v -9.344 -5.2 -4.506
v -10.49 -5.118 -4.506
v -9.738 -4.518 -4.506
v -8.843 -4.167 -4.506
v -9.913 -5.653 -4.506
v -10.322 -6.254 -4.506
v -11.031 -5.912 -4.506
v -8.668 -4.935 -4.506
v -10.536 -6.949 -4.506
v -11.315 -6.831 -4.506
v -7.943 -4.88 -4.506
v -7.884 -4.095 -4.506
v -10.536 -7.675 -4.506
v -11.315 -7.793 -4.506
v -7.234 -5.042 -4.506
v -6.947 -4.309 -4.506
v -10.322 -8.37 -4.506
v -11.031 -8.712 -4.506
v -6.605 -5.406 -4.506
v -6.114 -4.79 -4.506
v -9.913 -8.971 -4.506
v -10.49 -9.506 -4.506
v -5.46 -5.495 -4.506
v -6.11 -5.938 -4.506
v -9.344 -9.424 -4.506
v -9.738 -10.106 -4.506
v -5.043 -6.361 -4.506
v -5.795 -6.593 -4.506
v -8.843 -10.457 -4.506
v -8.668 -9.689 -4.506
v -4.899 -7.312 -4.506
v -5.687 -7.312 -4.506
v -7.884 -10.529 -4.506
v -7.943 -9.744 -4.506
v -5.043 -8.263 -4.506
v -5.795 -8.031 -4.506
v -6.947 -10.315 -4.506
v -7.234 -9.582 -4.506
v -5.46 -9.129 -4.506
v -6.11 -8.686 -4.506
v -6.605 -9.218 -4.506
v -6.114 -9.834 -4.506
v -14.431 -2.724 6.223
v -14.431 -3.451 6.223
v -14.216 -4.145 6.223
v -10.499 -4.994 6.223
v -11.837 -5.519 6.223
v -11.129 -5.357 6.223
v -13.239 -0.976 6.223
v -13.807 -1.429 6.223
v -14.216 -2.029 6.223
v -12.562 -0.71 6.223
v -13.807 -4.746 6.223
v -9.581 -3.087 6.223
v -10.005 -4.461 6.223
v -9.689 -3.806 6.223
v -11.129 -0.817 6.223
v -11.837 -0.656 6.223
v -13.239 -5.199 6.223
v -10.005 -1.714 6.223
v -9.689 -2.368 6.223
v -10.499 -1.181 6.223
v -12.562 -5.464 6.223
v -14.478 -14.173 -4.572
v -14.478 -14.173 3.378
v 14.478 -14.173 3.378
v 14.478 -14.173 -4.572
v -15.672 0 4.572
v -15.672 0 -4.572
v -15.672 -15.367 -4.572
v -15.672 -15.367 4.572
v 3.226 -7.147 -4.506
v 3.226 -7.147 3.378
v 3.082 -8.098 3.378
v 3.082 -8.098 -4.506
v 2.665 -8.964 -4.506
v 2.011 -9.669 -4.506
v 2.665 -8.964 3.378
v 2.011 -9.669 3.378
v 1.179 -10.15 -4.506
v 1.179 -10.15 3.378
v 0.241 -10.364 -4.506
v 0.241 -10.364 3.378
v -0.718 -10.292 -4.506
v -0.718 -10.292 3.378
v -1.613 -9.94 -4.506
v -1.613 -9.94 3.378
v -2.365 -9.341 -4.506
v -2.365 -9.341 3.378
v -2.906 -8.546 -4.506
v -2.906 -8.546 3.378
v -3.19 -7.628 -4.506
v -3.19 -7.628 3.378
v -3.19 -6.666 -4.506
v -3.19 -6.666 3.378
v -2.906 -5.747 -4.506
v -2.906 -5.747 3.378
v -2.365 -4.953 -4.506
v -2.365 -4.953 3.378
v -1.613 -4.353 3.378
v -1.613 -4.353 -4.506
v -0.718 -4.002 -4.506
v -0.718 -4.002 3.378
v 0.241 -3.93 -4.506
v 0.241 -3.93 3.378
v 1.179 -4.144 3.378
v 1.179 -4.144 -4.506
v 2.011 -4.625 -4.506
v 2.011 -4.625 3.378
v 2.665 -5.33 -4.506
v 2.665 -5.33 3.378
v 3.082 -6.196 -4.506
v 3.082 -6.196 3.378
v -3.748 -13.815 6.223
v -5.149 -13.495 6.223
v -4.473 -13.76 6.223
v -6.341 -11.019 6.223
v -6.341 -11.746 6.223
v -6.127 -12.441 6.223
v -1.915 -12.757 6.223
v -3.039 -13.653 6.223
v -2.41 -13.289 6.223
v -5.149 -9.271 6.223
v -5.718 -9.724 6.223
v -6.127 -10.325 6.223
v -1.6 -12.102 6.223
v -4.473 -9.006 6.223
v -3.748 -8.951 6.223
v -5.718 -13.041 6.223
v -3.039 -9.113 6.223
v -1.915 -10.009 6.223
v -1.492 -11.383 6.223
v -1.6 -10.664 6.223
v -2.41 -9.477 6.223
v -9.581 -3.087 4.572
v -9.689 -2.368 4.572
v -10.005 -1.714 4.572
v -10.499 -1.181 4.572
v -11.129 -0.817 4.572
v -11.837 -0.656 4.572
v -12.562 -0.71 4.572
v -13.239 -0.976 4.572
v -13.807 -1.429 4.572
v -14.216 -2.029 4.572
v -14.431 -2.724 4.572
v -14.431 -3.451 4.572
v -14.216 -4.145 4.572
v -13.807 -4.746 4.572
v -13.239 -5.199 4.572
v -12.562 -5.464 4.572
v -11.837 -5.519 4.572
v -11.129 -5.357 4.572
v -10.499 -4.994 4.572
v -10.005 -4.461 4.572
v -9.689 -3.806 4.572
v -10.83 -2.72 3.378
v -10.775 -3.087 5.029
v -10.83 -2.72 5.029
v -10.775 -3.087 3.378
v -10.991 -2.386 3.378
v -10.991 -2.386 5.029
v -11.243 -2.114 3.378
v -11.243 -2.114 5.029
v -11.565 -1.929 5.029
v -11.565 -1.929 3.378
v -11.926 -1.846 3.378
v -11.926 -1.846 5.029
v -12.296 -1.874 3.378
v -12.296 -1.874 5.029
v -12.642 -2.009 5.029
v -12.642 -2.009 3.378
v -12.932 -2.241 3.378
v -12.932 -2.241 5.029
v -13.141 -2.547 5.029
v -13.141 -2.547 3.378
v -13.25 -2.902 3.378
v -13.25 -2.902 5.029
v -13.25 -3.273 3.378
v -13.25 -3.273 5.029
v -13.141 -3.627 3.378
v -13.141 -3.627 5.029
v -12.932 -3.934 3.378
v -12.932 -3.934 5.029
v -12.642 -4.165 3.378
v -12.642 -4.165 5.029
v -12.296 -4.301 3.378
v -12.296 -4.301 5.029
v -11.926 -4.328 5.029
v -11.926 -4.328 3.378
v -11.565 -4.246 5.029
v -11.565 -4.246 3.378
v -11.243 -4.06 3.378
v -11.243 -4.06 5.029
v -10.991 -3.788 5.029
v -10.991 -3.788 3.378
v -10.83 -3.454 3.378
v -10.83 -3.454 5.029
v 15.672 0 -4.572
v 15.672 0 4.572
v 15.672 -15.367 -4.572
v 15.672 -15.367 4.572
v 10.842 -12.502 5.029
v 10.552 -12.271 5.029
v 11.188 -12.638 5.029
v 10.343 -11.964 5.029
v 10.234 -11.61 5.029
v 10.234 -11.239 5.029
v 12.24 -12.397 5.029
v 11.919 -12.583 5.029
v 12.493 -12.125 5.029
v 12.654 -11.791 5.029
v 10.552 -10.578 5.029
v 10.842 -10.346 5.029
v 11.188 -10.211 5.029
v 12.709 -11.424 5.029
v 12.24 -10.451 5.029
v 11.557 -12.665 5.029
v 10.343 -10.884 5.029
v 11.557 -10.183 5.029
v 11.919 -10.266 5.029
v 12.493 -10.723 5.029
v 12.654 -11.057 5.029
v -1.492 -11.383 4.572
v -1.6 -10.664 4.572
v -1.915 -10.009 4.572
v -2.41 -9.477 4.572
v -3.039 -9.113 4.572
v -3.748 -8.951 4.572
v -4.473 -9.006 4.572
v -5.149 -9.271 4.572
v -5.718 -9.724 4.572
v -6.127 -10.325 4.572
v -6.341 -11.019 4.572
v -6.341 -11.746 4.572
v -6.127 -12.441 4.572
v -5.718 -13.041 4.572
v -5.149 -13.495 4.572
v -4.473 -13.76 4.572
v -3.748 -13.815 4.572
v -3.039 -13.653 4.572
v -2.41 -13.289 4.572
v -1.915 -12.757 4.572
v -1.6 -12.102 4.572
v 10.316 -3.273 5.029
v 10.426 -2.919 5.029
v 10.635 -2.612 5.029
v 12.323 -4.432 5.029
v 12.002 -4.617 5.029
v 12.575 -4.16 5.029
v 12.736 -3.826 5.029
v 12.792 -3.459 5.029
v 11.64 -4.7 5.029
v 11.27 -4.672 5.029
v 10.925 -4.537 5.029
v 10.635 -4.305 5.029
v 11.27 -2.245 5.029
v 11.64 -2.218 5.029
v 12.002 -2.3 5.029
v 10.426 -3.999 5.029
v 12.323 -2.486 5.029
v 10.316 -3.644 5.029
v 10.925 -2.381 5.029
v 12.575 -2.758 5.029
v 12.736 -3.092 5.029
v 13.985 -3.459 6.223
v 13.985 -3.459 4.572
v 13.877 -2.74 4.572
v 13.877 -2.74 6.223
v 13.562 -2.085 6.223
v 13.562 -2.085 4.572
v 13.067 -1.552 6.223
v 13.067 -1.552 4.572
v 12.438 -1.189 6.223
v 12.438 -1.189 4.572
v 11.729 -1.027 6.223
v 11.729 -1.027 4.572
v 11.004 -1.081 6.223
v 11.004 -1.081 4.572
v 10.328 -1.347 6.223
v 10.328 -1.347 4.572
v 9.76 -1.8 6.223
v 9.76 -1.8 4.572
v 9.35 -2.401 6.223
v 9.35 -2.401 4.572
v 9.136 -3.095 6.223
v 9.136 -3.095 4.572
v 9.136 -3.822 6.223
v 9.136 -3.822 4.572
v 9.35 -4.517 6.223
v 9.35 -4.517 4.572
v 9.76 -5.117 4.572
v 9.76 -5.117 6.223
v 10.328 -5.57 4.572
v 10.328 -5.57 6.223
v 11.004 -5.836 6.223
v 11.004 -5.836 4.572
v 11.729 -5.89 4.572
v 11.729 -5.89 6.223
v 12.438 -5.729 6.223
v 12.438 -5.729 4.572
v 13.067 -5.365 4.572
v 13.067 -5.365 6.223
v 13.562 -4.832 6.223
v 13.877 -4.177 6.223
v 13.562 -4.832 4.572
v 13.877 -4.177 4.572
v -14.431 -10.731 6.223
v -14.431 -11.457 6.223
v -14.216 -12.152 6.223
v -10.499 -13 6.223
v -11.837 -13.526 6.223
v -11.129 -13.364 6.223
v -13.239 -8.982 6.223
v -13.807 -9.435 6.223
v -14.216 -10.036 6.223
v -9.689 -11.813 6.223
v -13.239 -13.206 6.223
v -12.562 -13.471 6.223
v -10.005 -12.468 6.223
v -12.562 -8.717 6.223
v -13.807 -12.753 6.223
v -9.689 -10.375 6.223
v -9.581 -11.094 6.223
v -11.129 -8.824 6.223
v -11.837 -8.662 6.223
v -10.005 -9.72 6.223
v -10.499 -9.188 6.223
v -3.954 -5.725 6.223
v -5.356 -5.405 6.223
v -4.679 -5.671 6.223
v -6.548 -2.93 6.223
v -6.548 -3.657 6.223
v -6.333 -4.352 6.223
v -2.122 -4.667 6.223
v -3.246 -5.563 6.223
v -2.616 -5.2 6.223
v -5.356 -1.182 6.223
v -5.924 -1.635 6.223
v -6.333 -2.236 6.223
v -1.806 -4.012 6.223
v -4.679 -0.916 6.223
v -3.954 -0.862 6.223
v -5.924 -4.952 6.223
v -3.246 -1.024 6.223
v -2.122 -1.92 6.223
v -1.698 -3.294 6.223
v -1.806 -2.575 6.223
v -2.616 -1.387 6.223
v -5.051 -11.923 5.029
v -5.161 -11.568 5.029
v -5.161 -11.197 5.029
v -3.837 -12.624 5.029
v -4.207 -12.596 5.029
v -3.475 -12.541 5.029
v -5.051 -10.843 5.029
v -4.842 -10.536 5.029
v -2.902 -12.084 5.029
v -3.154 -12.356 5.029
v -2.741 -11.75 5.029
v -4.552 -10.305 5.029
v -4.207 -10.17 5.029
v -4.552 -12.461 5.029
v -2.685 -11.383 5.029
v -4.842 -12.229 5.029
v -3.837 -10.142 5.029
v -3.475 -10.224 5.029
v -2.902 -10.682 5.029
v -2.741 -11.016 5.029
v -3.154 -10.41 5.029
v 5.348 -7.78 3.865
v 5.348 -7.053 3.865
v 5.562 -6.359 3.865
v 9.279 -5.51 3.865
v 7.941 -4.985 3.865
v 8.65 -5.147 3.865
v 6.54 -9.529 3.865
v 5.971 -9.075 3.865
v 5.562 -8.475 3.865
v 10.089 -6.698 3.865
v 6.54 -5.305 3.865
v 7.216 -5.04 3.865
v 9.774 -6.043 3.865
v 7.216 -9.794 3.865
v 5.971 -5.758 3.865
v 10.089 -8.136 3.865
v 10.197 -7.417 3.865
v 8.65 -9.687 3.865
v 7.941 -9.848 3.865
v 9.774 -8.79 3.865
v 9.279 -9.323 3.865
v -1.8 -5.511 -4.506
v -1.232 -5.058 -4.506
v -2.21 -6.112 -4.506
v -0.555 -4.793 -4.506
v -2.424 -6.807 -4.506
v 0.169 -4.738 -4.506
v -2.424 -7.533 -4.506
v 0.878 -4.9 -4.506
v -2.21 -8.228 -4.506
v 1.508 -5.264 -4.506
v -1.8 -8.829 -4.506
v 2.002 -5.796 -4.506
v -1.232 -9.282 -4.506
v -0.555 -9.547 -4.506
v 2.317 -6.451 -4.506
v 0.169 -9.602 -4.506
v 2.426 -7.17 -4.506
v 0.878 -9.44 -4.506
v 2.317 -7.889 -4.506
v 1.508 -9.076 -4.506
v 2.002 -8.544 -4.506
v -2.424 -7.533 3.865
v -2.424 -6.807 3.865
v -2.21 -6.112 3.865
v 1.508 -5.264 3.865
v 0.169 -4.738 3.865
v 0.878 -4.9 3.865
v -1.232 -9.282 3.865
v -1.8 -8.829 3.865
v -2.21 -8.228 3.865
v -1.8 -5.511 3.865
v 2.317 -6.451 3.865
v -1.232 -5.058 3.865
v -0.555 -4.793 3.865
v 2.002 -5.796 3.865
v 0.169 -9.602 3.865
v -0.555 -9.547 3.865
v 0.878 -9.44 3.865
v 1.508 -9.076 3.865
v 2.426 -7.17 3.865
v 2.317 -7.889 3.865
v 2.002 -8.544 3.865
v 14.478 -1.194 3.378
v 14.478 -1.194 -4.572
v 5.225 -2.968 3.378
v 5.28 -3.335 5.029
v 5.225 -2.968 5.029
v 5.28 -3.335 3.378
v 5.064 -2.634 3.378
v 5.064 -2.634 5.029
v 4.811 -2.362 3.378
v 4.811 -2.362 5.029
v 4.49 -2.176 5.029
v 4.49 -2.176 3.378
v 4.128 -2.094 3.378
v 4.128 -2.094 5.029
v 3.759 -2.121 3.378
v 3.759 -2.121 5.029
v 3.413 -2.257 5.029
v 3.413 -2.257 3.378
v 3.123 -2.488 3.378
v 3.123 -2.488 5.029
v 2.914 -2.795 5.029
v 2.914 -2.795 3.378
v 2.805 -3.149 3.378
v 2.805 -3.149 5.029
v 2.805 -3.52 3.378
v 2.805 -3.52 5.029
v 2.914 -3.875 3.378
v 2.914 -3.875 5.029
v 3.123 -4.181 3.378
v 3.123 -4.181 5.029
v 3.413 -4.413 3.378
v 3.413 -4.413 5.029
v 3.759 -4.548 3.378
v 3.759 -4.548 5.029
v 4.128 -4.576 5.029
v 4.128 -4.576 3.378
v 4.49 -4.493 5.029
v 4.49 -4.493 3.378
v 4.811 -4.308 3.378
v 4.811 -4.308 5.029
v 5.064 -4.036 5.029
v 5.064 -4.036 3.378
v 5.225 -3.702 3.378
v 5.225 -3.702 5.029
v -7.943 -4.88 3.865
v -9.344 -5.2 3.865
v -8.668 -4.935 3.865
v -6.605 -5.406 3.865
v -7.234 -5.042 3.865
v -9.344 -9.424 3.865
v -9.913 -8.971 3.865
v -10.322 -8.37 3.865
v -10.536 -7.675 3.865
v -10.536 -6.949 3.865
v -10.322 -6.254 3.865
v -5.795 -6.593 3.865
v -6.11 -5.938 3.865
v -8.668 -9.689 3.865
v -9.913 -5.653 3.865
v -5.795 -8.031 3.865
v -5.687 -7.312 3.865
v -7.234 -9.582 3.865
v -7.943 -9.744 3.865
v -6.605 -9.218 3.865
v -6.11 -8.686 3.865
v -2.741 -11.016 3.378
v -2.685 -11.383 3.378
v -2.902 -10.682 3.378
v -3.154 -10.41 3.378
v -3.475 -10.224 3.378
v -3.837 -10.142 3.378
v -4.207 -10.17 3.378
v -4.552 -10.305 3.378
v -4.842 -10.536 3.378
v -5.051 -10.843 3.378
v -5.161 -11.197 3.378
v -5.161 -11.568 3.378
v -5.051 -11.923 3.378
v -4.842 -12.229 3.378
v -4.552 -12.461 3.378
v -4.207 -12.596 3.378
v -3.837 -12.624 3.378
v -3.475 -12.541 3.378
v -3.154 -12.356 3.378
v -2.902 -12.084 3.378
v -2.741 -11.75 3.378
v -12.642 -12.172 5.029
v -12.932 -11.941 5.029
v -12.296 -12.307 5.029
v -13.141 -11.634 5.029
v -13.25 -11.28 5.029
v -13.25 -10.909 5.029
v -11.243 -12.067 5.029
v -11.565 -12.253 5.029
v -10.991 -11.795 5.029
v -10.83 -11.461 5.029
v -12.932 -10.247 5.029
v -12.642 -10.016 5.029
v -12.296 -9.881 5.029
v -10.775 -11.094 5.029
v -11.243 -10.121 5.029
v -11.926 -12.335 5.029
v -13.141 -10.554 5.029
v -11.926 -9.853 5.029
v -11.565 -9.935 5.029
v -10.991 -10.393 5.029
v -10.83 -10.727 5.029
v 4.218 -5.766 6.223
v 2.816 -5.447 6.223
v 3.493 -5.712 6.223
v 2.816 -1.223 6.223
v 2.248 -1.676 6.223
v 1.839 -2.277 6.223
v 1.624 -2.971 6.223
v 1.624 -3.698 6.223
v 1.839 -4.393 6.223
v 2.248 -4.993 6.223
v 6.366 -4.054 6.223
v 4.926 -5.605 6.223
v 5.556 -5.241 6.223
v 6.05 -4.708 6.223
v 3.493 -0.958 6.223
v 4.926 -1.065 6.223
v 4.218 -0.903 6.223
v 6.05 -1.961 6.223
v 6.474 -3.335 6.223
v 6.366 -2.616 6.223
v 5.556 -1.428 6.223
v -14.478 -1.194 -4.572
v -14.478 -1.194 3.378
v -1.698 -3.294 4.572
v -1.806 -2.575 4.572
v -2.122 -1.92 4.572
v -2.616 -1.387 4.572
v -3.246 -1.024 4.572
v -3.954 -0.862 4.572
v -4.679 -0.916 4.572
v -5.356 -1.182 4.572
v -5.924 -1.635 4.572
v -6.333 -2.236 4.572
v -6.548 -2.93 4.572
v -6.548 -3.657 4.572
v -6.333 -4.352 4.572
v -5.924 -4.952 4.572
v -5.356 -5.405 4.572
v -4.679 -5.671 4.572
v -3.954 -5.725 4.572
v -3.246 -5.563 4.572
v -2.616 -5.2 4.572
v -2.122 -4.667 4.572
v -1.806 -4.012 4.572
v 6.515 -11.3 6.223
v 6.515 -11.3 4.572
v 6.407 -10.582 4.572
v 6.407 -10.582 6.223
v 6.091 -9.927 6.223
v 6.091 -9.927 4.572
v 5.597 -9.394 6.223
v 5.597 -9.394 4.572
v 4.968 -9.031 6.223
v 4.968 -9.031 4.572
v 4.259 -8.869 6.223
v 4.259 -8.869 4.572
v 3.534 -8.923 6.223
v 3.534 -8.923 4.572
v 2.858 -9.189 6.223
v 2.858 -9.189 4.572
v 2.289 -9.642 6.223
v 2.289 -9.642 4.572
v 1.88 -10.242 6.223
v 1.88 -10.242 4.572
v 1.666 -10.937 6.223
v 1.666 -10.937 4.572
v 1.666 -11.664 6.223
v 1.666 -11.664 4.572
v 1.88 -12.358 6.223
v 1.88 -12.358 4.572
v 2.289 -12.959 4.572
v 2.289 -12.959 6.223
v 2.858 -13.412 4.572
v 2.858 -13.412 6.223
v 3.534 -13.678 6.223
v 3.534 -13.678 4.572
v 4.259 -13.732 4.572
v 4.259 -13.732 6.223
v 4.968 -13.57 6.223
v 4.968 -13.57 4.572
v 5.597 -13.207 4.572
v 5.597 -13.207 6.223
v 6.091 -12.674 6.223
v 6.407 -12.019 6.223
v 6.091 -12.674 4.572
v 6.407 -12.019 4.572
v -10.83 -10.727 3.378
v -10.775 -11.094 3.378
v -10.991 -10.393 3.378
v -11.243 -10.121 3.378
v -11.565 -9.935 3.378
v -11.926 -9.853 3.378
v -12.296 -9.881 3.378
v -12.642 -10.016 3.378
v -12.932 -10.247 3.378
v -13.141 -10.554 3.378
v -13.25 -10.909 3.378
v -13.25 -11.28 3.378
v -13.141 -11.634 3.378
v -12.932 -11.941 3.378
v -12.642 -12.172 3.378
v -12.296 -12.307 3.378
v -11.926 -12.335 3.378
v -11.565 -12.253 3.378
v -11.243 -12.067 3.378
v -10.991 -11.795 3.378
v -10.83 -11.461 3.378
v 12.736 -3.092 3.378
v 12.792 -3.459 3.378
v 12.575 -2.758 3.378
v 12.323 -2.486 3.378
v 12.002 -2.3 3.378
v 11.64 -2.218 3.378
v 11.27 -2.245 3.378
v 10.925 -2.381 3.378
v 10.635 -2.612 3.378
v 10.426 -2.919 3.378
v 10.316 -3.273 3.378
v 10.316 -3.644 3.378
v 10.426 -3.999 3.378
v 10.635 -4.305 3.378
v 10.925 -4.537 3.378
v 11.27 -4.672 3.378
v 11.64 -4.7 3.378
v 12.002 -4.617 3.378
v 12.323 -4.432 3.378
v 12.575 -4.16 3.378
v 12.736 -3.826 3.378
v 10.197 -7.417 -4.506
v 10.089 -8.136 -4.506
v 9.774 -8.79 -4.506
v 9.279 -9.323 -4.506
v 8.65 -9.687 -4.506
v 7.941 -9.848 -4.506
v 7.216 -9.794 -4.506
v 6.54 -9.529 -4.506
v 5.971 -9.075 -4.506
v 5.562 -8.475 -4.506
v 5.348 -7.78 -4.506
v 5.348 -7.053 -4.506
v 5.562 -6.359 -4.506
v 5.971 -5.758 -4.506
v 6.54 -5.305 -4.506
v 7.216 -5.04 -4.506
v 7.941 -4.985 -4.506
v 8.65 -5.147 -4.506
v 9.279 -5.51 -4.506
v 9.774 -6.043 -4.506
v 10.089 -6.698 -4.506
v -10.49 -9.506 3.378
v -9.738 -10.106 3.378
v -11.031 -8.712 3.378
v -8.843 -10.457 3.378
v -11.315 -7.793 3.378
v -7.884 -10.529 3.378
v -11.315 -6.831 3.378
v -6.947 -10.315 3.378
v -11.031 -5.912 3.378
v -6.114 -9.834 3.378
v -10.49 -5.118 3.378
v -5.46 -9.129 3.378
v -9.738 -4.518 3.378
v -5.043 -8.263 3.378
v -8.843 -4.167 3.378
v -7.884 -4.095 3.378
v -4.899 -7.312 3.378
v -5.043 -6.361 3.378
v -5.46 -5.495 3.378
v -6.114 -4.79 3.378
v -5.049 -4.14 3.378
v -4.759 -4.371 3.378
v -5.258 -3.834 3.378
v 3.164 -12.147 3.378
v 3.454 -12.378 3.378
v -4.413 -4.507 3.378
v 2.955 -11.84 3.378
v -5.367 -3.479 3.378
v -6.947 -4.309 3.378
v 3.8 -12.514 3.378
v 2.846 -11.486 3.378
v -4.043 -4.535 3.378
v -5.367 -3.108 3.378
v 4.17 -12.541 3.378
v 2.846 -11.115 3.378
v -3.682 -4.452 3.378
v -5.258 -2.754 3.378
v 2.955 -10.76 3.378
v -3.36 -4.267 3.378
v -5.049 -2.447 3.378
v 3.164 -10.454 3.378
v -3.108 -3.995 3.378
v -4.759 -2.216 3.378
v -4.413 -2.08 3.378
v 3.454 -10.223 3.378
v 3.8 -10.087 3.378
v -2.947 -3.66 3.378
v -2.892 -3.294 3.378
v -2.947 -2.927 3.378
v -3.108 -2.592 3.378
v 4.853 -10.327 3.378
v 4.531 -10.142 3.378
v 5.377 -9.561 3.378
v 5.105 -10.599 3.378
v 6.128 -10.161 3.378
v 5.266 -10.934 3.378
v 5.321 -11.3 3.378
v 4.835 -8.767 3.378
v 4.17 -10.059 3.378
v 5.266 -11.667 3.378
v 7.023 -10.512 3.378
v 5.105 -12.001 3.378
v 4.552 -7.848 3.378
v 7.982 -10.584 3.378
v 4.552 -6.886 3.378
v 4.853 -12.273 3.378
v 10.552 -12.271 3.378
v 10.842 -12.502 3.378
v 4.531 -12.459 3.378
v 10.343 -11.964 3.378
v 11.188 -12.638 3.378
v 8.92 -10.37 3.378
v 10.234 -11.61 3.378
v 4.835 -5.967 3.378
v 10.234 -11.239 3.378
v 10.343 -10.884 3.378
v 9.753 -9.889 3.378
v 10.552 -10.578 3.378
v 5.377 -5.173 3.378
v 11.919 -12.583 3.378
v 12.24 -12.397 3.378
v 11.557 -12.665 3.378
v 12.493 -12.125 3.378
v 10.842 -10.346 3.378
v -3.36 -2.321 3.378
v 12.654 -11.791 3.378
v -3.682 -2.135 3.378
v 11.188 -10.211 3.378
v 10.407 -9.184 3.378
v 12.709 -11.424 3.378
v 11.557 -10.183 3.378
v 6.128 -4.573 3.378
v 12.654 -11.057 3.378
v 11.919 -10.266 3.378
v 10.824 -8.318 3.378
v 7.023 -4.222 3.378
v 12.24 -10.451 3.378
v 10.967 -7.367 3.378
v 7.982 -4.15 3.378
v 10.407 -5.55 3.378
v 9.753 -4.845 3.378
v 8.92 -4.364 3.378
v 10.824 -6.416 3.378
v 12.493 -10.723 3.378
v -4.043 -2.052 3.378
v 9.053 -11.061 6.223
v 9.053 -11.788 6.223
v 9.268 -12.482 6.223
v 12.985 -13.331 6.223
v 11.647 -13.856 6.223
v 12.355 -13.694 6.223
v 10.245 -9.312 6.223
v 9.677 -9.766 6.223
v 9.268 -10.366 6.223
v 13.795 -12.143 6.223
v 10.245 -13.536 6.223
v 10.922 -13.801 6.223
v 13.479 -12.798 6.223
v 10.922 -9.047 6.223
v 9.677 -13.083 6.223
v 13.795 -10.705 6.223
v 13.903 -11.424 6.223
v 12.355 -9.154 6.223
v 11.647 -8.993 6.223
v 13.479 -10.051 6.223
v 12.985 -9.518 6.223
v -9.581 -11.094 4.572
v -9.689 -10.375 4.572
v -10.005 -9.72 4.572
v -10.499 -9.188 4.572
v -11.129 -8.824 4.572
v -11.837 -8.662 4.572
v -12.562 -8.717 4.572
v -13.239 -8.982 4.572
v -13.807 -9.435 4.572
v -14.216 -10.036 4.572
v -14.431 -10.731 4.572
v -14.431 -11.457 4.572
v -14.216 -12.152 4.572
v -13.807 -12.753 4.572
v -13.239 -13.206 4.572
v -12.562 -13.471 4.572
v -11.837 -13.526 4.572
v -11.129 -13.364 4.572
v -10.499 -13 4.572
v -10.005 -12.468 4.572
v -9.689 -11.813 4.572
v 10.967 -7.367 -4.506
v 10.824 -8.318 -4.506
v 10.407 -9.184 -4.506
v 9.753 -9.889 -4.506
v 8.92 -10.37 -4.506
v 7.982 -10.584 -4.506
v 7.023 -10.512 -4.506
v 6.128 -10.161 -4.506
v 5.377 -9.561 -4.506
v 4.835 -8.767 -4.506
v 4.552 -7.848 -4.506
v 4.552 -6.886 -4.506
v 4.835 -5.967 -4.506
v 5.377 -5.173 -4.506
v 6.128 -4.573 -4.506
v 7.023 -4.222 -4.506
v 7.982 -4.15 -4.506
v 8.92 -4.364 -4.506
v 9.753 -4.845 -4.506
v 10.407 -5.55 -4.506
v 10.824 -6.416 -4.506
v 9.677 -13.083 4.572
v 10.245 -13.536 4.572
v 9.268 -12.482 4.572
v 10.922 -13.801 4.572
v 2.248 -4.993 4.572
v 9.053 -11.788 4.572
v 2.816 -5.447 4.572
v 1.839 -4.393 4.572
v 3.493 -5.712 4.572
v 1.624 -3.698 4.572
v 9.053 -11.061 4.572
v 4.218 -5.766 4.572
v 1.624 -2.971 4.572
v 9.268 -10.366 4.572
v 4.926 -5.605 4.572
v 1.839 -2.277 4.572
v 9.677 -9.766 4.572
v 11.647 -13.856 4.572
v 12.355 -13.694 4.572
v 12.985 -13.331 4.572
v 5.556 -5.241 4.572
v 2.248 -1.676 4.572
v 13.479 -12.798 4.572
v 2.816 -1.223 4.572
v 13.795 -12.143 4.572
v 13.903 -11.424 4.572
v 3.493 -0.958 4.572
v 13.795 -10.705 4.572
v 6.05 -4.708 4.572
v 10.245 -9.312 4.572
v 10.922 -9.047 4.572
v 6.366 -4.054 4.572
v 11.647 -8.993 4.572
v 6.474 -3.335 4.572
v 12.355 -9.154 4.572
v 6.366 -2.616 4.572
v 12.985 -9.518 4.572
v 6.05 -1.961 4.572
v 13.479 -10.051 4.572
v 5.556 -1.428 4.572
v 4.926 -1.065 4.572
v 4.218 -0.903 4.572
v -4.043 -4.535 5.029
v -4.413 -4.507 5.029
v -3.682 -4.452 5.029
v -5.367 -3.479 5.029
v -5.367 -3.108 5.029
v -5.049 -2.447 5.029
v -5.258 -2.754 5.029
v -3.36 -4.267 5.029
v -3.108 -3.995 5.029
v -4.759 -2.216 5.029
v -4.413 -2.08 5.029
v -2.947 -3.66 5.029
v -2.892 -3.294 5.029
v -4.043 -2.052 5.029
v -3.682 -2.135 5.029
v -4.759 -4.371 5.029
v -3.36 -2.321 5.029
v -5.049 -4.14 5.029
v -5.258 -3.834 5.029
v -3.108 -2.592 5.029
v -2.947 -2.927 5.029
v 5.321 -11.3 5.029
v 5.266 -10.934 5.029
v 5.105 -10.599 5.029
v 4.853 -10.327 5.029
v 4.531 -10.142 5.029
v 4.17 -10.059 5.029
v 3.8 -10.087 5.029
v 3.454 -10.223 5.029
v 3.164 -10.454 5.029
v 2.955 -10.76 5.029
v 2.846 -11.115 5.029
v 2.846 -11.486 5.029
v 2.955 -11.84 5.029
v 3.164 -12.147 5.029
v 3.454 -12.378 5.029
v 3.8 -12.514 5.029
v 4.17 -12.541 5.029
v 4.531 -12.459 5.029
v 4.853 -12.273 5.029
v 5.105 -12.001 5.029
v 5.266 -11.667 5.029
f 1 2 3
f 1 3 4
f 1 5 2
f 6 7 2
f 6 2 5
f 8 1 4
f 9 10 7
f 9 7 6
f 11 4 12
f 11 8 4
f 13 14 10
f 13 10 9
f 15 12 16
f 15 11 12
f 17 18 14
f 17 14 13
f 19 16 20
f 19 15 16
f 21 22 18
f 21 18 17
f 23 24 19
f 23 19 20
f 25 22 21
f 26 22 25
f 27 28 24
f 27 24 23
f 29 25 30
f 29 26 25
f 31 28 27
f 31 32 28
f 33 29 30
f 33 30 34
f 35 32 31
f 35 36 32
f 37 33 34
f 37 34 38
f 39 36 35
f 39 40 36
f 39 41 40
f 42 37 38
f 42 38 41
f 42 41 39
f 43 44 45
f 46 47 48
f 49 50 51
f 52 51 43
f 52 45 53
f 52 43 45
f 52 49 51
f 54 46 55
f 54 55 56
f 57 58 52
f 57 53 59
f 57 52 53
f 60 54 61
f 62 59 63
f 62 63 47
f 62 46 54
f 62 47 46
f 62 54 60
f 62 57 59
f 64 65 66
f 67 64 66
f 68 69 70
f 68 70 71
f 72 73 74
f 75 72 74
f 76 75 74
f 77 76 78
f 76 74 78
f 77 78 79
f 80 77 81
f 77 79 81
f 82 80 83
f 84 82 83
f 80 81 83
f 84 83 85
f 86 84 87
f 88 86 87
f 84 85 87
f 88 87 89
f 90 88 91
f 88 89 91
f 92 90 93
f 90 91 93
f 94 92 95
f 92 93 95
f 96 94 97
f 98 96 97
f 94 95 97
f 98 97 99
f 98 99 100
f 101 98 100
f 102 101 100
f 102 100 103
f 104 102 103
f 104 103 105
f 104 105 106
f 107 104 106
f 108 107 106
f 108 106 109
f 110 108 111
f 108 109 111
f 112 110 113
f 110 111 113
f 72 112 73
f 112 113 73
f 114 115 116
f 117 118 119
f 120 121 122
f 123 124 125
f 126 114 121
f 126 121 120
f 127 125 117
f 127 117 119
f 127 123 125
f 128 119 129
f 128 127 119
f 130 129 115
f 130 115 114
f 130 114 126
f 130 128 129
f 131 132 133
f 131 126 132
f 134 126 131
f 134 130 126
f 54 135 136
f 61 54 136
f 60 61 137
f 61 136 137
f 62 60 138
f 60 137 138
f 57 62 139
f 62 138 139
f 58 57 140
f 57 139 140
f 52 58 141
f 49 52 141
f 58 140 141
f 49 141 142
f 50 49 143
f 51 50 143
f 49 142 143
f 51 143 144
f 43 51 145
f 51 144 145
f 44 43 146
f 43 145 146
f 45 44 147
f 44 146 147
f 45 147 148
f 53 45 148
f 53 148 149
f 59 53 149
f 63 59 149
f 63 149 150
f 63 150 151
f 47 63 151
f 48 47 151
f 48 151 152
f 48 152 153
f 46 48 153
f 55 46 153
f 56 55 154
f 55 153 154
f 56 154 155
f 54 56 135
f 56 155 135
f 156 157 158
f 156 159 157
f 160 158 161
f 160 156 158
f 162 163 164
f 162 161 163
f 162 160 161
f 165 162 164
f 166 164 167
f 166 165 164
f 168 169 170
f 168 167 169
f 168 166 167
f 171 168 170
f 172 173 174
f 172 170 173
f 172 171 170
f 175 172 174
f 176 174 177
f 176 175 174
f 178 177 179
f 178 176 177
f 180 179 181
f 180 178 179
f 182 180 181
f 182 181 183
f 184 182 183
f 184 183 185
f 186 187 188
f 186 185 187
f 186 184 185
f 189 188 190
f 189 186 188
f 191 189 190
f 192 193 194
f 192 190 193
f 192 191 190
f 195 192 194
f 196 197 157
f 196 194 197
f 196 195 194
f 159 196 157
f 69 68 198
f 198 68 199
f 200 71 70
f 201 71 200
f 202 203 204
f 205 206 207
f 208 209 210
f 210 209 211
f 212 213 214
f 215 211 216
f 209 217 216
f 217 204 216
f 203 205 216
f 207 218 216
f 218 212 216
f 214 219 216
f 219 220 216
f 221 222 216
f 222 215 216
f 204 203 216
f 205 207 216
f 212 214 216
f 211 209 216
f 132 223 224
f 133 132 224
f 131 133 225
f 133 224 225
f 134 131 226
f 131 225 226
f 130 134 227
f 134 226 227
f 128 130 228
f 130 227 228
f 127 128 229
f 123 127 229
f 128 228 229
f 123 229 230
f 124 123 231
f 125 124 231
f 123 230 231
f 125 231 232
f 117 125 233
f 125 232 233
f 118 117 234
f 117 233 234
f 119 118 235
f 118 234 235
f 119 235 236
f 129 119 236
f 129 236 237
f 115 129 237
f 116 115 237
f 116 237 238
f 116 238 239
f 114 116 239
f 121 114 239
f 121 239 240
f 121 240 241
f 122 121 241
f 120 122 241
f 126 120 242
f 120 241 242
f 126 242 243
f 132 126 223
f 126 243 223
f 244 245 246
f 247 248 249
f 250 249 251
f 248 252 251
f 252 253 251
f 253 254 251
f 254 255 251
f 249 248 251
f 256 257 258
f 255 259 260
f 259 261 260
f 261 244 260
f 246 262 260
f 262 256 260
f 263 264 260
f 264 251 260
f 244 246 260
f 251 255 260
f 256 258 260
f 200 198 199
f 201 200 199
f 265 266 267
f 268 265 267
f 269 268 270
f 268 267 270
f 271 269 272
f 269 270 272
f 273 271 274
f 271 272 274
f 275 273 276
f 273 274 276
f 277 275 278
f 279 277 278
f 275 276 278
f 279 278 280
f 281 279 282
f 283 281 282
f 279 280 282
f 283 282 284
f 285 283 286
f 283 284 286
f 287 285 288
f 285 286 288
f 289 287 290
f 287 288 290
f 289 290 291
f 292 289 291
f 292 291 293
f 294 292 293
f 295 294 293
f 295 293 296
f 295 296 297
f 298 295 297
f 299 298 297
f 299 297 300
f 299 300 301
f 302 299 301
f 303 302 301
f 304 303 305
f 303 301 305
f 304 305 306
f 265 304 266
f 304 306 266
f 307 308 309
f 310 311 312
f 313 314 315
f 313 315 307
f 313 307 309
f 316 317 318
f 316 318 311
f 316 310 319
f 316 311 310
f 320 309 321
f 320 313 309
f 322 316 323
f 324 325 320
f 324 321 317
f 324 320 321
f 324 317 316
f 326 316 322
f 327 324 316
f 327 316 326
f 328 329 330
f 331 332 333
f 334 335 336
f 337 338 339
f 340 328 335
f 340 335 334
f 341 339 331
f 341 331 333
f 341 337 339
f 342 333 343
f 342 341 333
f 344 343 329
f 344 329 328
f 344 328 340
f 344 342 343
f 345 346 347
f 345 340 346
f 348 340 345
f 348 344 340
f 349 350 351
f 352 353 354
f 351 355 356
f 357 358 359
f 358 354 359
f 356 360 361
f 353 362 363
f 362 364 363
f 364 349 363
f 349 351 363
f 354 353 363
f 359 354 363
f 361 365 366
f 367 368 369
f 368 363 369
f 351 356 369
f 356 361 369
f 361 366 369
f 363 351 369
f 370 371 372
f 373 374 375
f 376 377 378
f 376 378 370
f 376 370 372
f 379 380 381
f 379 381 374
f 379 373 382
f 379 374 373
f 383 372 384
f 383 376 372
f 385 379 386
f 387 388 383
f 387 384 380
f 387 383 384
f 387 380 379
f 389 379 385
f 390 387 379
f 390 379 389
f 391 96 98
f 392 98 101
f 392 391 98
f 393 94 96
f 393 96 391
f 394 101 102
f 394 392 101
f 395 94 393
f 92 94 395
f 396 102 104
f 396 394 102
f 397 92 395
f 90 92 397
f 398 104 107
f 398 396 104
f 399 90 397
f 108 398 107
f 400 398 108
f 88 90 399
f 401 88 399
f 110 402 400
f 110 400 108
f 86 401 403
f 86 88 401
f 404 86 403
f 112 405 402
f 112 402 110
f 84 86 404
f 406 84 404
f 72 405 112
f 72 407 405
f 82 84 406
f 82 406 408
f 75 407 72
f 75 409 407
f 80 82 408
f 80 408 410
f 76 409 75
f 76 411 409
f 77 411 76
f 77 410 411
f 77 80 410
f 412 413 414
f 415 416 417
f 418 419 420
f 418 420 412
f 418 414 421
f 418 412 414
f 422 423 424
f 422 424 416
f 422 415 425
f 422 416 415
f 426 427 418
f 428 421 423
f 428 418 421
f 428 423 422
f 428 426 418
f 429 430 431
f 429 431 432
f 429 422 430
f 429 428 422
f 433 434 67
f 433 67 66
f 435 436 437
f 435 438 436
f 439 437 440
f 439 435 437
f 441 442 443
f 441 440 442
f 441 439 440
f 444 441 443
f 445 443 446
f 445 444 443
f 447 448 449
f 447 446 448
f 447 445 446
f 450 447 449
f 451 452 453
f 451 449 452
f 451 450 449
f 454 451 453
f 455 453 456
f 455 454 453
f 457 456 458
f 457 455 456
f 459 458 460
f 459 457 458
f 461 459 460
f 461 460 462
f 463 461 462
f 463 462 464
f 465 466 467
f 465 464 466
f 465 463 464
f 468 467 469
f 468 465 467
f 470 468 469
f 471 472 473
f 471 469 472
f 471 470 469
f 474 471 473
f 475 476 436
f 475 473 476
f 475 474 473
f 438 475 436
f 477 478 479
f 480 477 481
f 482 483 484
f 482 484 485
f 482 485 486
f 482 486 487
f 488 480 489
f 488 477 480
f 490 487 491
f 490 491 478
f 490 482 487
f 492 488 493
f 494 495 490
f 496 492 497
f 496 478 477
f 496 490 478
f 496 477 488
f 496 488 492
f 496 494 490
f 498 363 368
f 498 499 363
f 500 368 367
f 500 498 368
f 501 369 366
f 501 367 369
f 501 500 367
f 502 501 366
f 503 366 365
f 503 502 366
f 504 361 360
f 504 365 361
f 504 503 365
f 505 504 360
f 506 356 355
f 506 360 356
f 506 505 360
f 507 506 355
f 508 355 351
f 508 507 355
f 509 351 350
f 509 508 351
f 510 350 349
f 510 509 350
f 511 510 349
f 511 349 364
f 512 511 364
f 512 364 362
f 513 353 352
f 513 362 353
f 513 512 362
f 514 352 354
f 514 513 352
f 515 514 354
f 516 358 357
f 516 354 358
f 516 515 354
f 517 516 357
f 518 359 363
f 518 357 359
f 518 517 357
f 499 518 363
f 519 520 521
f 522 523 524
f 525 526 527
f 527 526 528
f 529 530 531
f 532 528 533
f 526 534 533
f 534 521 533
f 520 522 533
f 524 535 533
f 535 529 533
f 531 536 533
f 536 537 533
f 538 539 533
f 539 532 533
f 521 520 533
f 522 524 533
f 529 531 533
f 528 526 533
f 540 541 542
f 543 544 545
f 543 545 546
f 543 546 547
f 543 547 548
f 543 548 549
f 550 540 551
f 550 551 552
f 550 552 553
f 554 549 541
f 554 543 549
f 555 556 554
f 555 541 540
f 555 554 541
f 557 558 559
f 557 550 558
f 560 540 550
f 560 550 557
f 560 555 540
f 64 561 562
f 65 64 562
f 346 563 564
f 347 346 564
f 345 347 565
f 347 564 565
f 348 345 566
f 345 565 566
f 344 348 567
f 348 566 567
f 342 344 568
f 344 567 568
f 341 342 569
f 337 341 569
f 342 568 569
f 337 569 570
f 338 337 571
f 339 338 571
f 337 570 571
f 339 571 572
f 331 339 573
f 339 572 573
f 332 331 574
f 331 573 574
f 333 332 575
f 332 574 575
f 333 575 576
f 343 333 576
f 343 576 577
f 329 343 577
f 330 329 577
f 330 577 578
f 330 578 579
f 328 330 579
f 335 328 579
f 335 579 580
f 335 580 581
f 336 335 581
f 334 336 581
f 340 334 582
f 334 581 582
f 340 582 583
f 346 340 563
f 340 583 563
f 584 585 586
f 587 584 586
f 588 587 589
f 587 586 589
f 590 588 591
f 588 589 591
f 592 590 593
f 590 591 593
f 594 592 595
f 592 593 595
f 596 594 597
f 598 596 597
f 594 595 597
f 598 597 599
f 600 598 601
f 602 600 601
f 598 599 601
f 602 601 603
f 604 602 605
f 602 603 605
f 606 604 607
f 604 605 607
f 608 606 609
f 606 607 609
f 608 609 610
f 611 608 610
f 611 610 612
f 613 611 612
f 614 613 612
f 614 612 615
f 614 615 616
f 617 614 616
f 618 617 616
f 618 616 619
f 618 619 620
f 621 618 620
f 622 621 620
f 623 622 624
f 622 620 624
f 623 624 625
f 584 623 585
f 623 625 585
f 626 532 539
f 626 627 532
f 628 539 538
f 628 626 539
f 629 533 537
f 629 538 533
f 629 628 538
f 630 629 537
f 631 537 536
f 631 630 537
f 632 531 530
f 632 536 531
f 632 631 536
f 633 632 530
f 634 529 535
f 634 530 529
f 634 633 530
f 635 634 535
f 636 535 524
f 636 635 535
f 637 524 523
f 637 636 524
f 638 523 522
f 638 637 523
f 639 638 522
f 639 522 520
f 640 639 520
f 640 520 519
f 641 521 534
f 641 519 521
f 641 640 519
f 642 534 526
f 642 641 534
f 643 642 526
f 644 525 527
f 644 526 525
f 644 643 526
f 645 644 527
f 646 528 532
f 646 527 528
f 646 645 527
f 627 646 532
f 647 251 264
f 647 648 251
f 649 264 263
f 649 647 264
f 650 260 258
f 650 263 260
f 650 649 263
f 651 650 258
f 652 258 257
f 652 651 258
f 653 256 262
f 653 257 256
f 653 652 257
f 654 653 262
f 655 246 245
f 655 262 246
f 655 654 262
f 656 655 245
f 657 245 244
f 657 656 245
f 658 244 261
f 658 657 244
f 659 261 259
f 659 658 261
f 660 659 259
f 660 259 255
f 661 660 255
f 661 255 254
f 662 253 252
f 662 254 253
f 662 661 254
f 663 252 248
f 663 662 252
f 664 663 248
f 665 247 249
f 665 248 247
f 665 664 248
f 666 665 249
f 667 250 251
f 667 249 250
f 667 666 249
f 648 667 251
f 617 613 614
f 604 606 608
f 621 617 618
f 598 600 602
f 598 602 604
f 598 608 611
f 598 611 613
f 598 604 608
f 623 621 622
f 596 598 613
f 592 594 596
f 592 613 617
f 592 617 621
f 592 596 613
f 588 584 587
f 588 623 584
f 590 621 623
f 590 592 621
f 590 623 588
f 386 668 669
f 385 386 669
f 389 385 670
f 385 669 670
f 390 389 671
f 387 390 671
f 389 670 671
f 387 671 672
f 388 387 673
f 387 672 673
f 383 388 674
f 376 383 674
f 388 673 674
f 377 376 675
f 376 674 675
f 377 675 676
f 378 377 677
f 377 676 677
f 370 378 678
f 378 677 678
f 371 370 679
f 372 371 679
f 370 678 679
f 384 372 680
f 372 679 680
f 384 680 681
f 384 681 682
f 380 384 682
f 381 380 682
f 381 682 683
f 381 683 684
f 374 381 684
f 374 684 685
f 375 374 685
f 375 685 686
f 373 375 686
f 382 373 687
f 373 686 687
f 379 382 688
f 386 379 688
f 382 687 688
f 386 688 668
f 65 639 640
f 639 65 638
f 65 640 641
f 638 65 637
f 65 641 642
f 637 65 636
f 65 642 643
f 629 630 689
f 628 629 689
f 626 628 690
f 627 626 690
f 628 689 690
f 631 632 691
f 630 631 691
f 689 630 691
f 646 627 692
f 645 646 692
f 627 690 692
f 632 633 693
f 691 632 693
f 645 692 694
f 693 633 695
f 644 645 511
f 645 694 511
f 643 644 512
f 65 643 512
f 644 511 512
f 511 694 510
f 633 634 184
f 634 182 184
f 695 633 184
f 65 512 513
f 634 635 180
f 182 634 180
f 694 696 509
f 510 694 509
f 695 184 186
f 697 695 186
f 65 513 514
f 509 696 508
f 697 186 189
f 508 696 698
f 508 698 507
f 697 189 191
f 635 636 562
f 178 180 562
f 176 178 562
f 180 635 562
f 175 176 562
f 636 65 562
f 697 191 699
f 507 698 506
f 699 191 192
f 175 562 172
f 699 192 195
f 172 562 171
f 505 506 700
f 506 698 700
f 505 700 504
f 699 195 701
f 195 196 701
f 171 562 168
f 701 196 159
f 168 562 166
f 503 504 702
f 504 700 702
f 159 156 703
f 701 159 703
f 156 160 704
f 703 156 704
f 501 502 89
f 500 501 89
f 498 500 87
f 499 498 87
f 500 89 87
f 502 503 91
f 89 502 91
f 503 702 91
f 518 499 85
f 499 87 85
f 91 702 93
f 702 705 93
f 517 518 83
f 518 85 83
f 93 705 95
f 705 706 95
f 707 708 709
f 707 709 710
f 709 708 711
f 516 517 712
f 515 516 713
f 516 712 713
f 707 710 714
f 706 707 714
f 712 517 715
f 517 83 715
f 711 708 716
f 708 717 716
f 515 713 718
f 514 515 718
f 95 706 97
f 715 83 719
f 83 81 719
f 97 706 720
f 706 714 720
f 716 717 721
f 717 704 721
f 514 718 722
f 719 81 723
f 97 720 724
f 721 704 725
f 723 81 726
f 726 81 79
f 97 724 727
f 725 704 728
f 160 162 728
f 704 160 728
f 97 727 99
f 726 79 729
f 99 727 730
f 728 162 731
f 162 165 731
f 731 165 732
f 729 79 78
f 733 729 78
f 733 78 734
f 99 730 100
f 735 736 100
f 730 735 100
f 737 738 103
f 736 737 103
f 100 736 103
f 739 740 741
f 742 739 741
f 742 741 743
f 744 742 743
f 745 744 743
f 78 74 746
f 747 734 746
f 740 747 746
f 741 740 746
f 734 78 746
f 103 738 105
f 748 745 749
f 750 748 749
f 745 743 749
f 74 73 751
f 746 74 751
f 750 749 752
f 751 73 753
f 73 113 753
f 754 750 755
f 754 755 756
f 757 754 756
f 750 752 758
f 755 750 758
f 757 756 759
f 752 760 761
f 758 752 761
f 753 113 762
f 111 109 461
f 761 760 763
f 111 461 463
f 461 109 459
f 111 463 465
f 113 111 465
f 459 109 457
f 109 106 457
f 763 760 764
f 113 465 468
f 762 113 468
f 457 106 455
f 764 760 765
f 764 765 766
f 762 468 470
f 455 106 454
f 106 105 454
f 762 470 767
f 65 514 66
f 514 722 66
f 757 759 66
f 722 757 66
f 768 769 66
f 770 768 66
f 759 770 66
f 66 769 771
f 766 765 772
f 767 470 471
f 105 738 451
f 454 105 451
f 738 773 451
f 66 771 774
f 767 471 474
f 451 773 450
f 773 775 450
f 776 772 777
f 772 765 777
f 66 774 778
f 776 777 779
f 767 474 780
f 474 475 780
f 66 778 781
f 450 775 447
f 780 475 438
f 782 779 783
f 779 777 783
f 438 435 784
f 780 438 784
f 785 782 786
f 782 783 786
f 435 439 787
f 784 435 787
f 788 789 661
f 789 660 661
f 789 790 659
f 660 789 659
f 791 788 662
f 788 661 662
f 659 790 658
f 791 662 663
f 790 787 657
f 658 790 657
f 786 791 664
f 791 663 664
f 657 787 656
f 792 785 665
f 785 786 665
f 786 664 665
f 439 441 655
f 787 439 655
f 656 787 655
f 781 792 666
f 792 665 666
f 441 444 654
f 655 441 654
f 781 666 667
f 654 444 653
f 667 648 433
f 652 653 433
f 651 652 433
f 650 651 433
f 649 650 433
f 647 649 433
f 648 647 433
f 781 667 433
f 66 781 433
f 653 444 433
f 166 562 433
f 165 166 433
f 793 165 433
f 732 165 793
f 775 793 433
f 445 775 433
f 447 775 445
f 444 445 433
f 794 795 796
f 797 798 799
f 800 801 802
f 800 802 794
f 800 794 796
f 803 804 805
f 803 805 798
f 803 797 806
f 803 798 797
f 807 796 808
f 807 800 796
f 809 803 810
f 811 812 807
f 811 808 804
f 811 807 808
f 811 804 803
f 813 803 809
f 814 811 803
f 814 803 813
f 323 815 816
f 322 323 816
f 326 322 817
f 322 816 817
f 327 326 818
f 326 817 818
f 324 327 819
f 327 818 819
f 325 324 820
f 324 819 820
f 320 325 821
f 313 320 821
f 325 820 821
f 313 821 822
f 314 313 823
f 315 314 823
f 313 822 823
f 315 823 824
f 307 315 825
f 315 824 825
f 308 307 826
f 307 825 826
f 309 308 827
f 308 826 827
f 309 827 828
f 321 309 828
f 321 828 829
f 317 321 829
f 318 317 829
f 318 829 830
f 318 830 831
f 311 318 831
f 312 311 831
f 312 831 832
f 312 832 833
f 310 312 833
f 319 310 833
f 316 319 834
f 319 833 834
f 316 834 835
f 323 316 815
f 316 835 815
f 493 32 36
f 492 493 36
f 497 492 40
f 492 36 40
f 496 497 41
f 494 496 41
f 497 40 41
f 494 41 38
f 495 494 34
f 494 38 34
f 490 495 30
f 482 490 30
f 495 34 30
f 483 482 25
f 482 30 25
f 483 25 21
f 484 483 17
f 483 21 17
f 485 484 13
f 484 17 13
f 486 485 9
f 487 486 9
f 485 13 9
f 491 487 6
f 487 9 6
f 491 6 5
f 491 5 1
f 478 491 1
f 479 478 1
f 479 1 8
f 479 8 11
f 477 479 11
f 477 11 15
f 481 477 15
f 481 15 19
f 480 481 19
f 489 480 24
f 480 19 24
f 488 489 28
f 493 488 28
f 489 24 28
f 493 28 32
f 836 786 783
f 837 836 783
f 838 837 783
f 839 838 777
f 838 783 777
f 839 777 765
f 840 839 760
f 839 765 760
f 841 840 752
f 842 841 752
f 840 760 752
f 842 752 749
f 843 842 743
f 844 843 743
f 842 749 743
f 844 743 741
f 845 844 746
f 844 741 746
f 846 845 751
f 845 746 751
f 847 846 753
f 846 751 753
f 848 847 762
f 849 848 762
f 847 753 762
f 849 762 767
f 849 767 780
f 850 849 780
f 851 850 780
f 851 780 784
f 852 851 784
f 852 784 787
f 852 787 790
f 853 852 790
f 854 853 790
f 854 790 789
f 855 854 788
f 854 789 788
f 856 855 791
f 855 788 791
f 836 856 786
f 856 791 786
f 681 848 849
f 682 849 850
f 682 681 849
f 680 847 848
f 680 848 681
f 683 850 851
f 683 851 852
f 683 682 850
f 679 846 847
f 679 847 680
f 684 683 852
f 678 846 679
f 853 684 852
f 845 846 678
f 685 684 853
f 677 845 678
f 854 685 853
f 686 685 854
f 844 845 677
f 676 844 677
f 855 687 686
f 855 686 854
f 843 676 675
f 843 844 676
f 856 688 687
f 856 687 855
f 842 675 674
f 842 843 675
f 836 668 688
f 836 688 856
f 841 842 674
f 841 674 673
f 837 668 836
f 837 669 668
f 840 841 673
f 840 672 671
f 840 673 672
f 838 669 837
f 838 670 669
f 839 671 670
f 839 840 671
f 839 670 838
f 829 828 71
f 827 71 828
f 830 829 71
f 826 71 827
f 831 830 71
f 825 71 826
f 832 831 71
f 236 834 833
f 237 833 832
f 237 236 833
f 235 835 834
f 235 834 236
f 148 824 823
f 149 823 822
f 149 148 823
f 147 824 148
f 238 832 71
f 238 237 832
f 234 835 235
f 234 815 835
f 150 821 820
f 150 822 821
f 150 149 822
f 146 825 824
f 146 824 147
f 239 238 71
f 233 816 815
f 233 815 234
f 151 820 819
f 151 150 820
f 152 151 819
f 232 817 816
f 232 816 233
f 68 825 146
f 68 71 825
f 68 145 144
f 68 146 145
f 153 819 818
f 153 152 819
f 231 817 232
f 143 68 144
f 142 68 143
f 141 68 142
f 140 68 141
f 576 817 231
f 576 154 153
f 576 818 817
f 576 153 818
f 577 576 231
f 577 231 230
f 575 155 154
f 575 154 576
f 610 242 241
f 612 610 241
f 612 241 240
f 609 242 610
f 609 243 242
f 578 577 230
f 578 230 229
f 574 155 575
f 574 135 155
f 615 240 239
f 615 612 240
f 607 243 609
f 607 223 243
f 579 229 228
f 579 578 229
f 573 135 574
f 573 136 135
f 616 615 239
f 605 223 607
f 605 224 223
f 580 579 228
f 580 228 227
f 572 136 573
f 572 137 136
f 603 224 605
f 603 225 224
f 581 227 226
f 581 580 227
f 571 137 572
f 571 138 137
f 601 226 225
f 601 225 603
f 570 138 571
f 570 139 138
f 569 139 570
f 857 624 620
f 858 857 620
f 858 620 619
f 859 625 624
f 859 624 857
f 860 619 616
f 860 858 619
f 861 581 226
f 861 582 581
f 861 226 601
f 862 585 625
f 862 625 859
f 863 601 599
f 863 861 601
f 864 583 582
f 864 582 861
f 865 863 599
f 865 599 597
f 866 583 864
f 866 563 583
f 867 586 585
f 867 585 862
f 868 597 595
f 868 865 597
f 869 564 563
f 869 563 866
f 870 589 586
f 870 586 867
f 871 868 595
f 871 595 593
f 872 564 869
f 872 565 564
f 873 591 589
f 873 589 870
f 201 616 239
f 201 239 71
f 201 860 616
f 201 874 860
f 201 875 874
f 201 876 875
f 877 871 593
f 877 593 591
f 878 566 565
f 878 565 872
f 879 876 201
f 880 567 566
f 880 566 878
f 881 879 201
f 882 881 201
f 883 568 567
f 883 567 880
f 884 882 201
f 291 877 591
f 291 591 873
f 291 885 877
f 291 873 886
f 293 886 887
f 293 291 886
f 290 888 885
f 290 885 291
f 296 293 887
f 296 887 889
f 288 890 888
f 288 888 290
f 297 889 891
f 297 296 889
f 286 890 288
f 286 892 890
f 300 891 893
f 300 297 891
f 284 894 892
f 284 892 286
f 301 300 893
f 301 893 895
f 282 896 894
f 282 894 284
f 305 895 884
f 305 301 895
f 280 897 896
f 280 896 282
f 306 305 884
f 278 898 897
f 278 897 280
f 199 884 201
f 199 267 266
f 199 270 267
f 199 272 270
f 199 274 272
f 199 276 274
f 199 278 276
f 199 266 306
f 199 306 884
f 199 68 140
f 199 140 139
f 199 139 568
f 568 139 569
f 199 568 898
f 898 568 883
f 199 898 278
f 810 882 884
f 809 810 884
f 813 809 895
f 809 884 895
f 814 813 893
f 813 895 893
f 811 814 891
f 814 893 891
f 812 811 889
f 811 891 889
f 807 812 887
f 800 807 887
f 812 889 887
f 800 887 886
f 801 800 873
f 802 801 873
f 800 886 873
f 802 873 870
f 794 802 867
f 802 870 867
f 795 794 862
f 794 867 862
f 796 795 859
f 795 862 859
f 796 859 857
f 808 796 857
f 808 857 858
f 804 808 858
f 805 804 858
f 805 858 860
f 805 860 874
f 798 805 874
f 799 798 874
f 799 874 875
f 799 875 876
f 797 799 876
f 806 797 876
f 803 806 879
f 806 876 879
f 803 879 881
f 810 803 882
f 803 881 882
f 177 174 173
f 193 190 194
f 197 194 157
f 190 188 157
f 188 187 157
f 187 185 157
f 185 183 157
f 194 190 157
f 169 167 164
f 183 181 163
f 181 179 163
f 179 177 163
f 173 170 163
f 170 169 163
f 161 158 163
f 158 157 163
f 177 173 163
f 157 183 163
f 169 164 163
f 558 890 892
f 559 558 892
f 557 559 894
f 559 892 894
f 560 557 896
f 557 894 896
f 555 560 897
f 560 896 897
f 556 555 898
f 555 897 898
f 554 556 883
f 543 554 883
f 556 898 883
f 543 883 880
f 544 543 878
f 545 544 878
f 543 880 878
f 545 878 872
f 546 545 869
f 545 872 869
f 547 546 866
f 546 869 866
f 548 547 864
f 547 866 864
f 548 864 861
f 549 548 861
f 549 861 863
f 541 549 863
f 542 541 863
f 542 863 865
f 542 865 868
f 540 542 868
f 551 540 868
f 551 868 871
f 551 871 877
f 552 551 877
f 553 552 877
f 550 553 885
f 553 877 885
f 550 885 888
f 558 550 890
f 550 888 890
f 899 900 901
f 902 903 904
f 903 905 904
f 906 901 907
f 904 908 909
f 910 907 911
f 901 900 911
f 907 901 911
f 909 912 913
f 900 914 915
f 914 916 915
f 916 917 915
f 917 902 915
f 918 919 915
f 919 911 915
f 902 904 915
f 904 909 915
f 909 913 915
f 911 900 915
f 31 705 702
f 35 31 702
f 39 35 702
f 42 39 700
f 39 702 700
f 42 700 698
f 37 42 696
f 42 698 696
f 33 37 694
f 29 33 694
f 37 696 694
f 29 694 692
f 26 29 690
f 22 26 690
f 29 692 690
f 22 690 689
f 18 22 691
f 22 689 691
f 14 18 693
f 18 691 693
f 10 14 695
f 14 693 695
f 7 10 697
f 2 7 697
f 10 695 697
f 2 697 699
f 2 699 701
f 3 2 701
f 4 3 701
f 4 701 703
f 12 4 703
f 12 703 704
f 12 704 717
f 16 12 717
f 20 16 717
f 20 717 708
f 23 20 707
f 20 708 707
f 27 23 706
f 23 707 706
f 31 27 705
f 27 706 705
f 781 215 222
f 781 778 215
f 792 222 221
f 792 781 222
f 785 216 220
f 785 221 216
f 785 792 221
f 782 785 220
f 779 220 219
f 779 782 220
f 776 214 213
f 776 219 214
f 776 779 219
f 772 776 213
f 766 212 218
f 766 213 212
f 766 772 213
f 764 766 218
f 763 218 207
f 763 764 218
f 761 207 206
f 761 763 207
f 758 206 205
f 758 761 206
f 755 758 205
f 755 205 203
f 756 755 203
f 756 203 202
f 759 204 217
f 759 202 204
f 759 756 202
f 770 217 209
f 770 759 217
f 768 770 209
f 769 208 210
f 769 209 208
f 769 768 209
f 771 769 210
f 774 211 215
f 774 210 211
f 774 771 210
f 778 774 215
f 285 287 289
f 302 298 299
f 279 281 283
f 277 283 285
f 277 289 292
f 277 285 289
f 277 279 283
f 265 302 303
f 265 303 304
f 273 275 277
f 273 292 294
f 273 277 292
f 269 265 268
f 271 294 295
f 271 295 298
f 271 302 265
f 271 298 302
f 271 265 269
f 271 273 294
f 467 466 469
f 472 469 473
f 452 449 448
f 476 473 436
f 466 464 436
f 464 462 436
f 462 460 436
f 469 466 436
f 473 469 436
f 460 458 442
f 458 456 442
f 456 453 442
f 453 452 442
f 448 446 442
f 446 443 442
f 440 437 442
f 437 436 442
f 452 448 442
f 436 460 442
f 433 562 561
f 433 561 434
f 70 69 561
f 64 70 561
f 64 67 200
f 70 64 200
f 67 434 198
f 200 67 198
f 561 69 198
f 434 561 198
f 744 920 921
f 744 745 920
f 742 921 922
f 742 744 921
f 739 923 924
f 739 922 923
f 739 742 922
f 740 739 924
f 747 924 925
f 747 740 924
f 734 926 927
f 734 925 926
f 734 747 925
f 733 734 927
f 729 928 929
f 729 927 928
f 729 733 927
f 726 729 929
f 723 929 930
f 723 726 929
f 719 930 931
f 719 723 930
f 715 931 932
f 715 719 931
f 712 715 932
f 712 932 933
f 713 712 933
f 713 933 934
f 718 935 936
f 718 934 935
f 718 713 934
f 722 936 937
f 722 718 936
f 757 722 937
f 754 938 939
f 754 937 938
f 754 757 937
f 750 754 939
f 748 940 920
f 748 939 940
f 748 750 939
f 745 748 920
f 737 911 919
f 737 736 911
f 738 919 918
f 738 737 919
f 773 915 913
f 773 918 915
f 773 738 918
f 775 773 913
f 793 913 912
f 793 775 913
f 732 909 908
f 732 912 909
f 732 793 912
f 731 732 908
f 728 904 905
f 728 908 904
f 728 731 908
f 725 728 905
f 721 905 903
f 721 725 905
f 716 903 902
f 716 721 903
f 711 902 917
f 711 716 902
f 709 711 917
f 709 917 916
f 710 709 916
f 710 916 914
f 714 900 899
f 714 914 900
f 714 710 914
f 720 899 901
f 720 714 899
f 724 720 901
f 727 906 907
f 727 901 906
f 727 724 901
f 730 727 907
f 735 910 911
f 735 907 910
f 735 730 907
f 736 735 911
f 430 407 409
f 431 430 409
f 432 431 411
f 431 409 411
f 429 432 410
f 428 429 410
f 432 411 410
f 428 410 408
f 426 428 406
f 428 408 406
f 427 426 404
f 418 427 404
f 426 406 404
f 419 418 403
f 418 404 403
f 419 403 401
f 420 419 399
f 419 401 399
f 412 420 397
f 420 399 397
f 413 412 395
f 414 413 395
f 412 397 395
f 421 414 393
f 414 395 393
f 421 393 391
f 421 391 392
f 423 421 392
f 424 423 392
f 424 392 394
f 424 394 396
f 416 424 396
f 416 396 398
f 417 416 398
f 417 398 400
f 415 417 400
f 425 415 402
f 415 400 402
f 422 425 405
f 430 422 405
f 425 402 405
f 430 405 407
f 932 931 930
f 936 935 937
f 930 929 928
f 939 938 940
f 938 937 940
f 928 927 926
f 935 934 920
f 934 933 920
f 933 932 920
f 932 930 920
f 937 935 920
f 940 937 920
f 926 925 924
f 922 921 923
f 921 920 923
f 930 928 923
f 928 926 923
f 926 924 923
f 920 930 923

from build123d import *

# Parameters (mm, degrees)
F0_W     = 31.3436
F0_H     = 9.144
F1_DEPTH = 15.367
F2_R     = 2.4384
F3_DEPTH = 1.651
F4_T     = -1.1938
F5_R     = 3.2258
F6_DEPTH = 7.88406
F7_R     = 2.4384
F8_DEPTH = 8.37132


# Not quite as in the source:
# - the program builds the solid bodies; features that only make, move or delete a surface that nothing else refers to are left out


with BuildPart() as f1:
    # F0 (on Front) → F1 (new body)
    with BuildSketch(Plane.XZ):
        Rectangle(F0_W, F0_H)
    extrude(amount=F1_DEPTH)

    # F2 (on face) → F3 (join)
    with BuildSketch(Plane.XY.offset(4.572)):
        with Locations((-12.0193809271, -3.087217221)):
            Circle(F2_R)
        with Locations((-4.1364012286, -3.2935778145)):
            Circle(F2_R)
        with Locations((4.0354835801, -3.33484984)):
            Circle(F2_R)
        with Locations((11.5470141172, -3.4586666152)):
            Circle(F2_R)
        with Locations((11.4644700661, -11.4241903648)):
            Circle(F2_R)
        with Locations((4.0767556056, -11.3003747538)):
            Circle(F2_R)
        with Locations((-3.9300406352, -11.3829188049)):
            Circle(F2_R)
        with Locations((-12.0193809271, -11.094013229)):
            Circle(F2_R)
    extrude(amount=F3_DEPTH)

    # F4
    f4_openings = [f1.faces().sort_by_distance(p)[0] for p in [
        (0, -7.6835, -4.572),
    ]]
    offset(amount=F4_T, openings=f4_openings, kind=Kind.INTERSECTION)

    # F5 (on face) → F6 (join)
    with BuildSketch(Plane(origin=(0, 0, 3.3782), x_dir=(1, 0, 0), z_dir=(0, 0, -1))):
        with Locations((-8.1251291558, 7.3120272718)):
            Circle(F5_R)
        with Locations((0, 7.1467519738)):
            Circle(F5_R)
        with Locations((7.7412822284, 7.3671187274)):
            Circle(F5_R)
    extrude(amount=F6_DEPTH)

    # F7 (on face) → F8 (cut)
    with BuildSketch(Plane(origin=(0, 0, -4.50586), x_dir=(1, 0, 0), z_dir=(0, 0, -1))):
        with Locations((-8.1251291558, 7.3120272718)):
            Circle(F7_R)
        with Locations((-0.012788114, 7.1699875407)):
            Circle(F7_R)
        with Locations((7.7589382418, 7.4168494903)):
            Circle(F7_R)
    extrude(amount=-F8_DEPTH, mode=Mode.SUBTRACT)


solid = f1.part
